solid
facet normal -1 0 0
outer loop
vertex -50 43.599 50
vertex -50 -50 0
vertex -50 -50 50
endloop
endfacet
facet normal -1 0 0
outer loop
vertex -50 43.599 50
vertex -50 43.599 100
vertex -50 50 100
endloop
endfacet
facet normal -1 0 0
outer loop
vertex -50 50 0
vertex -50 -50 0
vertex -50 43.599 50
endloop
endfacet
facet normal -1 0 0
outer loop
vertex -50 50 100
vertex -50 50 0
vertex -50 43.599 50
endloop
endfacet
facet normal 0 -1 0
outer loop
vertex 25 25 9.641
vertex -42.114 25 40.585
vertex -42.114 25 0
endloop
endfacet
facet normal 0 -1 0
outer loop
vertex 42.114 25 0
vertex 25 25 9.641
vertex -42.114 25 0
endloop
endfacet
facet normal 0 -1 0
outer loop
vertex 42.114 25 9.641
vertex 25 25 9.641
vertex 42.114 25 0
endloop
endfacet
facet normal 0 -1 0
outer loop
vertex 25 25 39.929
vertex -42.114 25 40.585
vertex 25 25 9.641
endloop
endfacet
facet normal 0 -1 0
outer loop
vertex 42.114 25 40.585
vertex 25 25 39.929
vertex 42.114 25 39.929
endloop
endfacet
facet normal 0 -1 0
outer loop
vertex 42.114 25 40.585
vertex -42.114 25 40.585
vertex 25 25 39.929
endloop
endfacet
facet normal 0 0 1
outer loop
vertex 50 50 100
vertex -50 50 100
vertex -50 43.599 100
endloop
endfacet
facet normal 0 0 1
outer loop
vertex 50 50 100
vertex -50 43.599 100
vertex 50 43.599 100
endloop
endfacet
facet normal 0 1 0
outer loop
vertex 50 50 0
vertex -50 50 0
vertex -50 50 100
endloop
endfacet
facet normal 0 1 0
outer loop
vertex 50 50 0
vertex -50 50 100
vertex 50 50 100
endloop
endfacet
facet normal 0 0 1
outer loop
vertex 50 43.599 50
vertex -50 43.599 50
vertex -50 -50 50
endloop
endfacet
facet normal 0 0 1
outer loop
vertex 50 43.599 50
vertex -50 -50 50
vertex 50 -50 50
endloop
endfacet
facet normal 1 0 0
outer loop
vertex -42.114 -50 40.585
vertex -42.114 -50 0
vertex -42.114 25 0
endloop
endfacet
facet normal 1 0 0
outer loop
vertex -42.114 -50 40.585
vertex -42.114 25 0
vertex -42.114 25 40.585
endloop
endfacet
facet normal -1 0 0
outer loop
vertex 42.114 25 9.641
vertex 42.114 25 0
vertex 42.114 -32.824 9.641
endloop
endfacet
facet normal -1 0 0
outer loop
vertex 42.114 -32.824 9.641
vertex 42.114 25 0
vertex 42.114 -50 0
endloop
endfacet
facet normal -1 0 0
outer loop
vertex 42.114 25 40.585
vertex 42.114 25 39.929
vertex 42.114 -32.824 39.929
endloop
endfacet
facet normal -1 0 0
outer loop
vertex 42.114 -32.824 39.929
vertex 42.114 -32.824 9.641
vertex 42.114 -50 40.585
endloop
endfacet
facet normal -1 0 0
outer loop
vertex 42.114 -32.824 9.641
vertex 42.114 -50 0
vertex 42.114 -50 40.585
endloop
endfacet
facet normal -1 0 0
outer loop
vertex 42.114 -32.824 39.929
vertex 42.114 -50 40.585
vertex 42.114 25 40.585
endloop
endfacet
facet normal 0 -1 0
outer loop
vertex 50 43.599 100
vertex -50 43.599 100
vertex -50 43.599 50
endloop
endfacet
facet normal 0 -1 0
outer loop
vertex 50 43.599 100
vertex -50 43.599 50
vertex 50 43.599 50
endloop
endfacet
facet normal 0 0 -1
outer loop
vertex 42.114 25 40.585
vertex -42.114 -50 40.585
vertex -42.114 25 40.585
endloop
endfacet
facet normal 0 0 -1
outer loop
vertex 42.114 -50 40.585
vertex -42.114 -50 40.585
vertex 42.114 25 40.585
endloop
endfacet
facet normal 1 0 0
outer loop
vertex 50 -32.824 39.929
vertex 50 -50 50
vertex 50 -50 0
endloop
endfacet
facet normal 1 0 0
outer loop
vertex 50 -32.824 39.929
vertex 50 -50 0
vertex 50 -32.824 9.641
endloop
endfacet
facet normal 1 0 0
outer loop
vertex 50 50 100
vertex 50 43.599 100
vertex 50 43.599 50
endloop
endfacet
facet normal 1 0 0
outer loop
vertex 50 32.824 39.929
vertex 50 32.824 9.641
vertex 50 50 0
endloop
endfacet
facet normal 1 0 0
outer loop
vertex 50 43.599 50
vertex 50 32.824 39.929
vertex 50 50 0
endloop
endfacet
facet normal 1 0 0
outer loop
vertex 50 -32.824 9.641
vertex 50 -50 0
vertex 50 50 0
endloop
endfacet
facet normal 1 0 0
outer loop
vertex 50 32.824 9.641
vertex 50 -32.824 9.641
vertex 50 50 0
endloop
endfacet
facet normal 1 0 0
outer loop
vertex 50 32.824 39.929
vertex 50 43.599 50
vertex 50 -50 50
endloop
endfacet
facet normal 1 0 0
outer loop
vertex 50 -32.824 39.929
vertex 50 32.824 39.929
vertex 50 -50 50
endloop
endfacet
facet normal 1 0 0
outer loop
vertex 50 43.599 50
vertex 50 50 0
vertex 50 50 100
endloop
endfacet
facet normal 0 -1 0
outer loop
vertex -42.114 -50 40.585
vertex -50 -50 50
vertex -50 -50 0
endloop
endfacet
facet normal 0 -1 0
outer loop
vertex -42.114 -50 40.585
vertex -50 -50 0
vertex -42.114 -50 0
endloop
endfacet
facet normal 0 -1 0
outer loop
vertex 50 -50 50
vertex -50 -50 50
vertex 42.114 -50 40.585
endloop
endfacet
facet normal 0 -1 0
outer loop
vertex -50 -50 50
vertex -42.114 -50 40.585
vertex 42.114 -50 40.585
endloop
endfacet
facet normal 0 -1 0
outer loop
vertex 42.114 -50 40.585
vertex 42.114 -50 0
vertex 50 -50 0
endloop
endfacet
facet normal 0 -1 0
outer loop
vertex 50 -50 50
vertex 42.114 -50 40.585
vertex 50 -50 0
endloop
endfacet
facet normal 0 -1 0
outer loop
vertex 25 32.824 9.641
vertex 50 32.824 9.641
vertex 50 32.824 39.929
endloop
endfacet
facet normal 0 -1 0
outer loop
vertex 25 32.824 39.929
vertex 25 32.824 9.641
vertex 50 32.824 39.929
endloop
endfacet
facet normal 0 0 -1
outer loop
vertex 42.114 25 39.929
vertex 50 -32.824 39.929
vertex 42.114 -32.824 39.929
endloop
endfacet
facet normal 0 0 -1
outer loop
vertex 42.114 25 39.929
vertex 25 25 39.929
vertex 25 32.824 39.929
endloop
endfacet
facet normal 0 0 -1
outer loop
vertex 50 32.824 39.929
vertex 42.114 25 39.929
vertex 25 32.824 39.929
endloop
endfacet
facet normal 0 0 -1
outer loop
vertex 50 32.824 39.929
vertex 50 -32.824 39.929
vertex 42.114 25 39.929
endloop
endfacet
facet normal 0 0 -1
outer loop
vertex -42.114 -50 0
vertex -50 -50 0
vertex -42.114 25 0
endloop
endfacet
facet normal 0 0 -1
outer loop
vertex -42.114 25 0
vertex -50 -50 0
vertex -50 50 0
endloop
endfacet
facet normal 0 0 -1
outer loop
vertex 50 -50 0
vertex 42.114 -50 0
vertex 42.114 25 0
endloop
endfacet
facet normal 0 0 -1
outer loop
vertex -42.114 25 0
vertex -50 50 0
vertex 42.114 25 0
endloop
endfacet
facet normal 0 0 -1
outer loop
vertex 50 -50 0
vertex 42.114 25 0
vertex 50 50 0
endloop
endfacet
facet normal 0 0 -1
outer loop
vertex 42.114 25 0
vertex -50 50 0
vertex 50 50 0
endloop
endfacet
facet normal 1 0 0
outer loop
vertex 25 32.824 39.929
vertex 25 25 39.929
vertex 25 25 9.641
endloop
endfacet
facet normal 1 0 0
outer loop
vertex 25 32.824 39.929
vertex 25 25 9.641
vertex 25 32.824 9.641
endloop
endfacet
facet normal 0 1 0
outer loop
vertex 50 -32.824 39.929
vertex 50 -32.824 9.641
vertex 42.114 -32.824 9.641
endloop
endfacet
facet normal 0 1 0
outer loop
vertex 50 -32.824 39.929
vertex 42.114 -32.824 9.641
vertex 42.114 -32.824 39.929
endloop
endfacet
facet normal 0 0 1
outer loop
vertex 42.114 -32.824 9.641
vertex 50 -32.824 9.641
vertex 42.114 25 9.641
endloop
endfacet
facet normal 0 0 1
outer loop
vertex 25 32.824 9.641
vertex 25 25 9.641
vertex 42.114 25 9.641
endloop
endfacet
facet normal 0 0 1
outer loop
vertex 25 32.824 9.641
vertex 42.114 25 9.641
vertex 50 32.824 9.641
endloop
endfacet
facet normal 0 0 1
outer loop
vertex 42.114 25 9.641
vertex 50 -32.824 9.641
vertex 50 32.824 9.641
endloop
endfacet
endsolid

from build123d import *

# Parameters (mm, degrees)
F0_W     = 100
F0_H     = 100
F1_DEPTH = 100
F2_W     = 100
F2_H     = 93.59855
F3_DEPTH = 50
F4_W     = 84.22891
F4_H     = 40.867575
F5_DEPTH = 75
F6_W     = 65.648086
F6_H     = 30.288235
F7_DEPTH = 25


with BuildPart() as f1:
    # F0 (on Top) → F1 (new body)
    with BuildSketch(Plane.XY):
        Rectangle(F0_W, F0_H)
    extrude(amount=F1_DEPTH)

    # F2 (on face) → F3 (cut)
    with BuildSketch(Plane.XY.offset(100)):
        with Locations((0, -3.200725)):
            Rectangle(F2_W, F2_H)
    extrude(amount=-F3_DEPTH, mode=Mode.SUBTRACT)

    # F4 (on face) → F5 (cut)
    with BuildSketch(Plane.XZ.offset(50)):
        with Locations((0, 20.151093)):
            Rectangle(F4_W, F4_H)
    extrude(amount=-F5_DEPTH, mode=Mode.SUBTRACT)

    # F6 (on face) → F7 (cut)
    with BuildSketch(Plane.YZ.offset(50)):
        with Locations((0, 24.784692)):
            Rectangle(F6_W, F6_H)
    extrude(amount=-F7_DEPTH, mode=Mode.SUBTRACT)


solid = f1.part
